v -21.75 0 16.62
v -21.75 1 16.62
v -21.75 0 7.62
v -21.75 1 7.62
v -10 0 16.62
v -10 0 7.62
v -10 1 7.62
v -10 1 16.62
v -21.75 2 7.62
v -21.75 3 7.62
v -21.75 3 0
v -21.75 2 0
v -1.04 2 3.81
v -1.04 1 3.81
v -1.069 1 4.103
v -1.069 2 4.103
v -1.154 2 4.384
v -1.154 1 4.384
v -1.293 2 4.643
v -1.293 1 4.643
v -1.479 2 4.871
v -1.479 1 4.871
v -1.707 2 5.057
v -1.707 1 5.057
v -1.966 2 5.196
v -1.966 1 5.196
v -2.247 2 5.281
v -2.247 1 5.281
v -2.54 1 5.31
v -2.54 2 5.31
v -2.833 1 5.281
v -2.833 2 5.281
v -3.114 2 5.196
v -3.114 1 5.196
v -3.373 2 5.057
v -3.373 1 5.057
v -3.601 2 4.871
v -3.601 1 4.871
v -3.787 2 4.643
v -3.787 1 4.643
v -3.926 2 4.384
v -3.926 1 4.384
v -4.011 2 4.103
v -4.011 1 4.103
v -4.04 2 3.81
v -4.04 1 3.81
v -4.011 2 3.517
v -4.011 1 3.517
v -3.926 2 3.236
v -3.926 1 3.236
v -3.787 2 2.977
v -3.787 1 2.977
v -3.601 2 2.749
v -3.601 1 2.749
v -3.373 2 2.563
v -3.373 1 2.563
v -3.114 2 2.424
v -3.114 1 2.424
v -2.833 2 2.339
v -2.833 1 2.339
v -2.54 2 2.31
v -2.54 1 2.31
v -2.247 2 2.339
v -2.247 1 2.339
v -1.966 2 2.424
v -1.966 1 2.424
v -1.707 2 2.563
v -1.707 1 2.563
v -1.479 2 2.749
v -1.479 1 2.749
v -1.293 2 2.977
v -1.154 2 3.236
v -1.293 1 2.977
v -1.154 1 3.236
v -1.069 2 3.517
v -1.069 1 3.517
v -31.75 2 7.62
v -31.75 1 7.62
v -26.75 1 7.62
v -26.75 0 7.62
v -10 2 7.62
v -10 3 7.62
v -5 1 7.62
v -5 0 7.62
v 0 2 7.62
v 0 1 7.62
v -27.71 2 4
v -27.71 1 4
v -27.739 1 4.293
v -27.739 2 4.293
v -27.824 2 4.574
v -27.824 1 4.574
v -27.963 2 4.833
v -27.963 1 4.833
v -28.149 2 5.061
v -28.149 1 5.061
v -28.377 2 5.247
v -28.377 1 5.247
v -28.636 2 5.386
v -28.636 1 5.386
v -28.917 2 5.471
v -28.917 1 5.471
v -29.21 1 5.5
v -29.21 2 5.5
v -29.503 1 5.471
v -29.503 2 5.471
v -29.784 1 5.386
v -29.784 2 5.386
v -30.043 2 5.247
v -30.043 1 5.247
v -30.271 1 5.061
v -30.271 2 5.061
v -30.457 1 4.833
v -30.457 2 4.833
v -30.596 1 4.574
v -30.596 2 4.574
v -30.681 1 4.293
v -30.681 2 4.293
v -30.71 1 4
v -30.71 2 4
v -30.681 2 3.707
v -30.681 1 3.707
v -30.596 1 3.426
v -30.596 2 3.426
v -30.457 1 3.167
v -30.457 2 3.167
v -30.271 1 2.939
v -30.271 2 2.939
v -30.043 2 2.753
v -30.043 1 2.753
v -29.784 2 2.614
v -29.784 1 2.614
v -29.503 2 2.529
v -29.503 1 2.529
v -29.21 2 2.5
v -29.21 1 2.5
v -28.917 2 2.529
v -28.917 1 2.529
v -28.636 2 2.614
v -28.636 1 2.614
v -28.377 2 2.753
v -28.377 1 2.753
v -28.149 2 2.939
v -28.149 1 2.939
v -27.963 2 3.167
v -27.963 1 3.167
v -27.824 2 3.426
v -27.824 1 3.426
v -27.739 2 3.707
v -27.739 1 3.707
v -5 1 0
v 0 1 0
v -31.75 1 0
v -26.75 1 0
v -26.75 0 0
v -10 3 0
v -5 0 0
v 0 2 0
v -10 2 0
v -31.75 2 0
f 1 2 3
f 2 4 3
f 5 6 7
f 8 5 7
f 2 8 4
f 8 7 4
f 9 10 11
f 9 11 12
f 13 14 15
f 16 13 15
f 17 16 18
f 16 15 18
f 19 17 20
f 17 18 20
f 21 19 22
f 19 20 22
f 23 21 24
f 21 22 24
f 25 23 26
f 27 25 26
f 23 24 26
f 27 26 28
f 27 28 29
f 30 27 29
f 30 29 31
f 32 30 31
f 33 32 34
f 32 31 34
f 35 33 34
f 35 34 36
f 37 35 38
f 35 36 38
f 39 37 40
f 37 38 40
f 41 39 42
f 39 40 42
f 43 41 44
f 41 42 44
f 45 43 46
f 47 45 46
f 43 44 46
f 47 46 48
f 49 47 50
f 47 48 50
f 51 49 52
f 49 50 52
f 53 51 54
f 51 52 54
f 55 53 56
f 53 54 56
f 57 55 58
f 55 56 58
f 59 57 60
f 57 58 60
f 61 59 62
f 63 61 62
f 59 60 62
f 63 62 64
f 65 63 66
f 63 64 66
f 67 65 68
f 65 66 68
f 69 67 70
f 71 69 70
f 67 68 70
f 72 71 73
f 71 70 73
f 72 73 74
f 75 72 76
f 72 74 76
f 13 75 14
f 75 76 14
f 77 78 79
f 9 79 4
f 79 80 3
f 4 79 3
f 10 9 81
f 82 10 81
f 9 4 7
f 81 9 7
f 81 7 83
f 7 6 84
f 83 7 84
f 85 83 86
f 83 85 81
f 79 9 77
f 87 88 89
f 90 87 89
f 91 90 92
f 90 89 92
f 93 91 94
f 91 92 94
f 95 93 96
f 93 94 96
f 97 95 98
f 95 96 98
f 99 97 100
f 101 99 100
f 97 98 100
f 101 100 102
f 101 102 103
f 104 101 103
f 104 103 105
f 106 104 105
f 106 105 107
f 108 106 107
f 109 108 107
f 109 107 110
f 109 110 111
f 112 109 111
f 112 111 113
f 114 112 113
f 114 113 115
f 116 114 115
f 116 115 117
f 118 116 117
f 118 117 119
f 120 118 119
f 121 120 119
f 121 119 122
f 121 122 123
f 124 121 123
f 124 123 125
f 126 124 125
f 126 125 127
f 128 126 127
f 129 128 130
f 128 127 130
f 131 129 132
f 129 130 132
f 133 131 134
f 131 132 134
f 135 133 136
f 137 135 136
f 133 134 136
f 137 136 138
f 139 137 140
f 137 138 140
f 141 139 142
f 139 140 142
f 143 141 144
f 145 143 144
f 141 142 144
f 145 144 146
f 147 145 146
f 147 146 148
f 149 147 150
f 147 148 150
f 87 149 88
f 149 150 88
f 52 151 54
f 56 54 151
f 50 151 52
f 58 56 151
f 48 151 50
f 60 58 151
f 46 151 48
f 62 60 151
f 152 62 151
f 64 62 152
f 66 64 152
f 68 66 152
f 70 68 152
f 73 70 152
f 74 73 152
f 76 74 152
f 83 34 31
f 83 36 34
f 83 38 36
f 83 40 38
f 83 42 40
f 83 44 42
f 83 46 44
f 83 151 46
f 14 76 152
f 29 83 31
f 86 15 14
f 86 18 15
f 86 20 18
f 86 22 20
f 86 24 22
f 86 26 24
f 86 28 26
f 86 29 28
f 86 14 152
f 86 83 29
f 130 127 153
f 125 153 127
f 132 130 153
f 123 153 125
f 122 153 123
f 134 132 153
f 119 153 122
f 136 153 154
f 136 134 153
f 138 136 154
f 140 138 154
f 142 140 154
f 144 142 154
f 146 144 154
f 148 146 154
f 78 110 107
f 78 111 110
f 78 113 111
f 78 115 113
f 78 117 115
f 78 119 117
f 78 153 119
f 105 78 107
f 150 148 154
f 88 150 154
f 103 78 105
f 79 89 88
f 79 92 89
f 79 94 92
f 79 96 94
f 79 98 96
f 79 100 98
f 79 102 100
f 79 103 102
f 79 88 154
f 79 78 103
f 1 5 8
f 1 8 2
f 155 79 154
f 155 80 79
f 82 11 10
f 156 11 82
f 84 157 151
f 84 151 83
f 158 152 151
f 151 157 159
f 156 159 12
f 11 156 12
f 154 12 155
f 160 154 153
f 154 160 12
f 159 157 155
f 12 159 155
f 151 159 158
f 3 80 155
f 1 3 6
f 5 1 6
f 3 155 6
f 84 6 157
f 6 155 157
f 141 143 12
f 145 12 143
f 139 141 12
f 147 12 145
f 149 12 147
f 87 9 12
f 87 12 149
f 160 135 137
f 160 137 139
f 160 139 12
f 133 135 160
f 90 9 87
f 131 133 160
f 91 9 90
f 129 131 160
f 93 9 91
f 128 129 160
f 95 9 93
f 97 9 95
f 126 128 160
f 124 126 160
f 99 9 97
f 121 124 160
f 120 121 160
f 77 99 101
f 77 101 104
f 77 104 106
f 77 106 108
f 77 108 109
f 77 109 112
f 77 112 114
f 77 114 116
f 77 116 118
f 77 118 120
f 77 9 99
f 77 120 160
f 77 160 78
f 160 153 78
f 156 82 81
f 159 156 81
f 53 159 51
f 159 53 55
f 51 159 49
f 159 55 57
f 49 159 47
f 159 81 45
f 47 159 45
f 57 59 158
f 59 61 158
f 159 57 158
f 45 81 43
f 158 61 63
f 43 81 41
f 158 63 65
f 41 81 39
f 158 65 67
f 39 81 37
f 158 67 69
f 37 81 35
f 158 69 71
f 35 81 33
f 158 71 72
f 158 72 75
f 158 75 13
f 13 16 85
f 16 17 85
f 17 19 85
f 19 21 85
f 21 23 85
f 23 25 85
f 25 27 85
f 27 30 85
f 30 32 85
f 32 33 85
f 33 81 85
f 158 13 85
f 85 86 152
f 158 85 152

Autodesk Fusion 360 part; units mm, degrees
sketch "Sketch6" plane through (0, 0, 0) normal (0, 1, 0) x (1, 0, 0)
  line L0 (0, 0) -> (-31.75, 0)
  line L1 (-31.75, 0) -> (-31.75, -7.62)
  line L2 (-31.75, -7.62) -> (0, -7.62)
  line L3 (0, -7.62) -> (0, 0)
  dimension "d16" = 7.62
  dimension "d17" = 31.75
extrude "Extrude5" add sketch "Sketch6" along normal blind 3
sketch "Sketch7" plane through (0, 0, 0) normal (0, -1, 0) x (1, 0, 0)
  line L0 (0, 0) -> (0, 7.62)
  line L1 (0, 7.62) -> (-31.75, 7.62)
  line L2 (-31.75, 7.62) -> (-31.75, 0)
  line L3 (-31.75, 0) -> (0, 0)
  circle A0 centre (-29.21, 4) radius 1.5
  circle A1 centre (-2.54, 3.81) radius 1.5
  line L4 (-31.75, 7.62) -> (-26.75, 7.62)
  line L5 (-26.75, 7.62) -> (-26.75, 0)
  line L6 (-26.75, 0) -> (-31.75, 0)
  line L7 (-31.75, 0) -> (-31.75, 7.62)
  line L8 (0, 0) -> (-5, 0)
  line L9 (-5, 0) -> (-5, 7.62)
  line L10 (-5, 7.62) -> (0, 7.62)
  line L11 (0, 7.62) -> (0, 0)
  line L12 (-31.75, 7.62) -> (-21.75, 7.62)
  line L13 (-21.75, 7.62) -> (-21.75, 0)
  line L14 (-21.75, 0) -> (-31.75, 0)
  line L15 (-31.75, 0) -> (-31.75, 7.62)
  line L16 (0, 0) -> (-10, 0)
  line L17 (-10, 0) -> (-10, 7.62)
  line L18 (-10, 7.62) -> (0, 7.62)
  line L19 (0, 7.62) -> (0, 0)
  dimension "d20" = 3
  dimension "d21" = 3
  dimension "d22" = 26.67
  dimension "d24" = 2.54
  dimension "d25" = 3.81
  dimension "d30" = 5
  dimension "d31" = 5
  dimension "d36" = 10
  dimension "d37" = 10
extrude "Extrude8" cut sketch "Sketch7" against normal blind 1 contours L1 L2 L3 L4 L5 L6 L7 L12 L14 L15
extrude "Extrude7" cut sketch "Sketch7" against normal blind 3 contours A1
extrude "Extrude6" cut sketch "Sketch7" against normal blind 3 contours A0
extrude "Extrude9" cut sketch "Sketch7" against normal blind 1 contours L0 L1 L3 L8 L9 L10 L11 L16 L18 L19
sketch "Sketch8" plane through (0, 3, 0) normal (0, 1, 0) x (-1, 0, 0)
  circle A0 centre (29.21, 4) radius 1.5
  circle A1 centre (2.54, 3.81) radius 1.5
  line L0 (0, 7.62) -> (0, 0)
  line L1 (0, 0) -> (31.75, 0)
  line L2 (31.75, 0) -> (31.75, 7.62)
  line L3 (31.75, 7.62) -> (0, 7.62)
sketch "Sketch9" plane through (0, 0, 7.62) normal (0, 0, 1) x (-1, 0, 0)
  line L0 (5, -1) -> (0, -1)
  line L1 (0, -1) -> (0, -3)
  line L2 (0, -3) -> (31.75, -3)
  line L3 (31.75, -3) -> (31.75, -1)
  line L4 (31.75, -1) -> (26.75, -1)
  line L5 (26.75, -1) -> (26.75, 0)
  line L6 (26.75, 0) -> (5, 0)
  line L7 (5, 0) -> (5, -1)
  line L8 (31.75, -3) -> (21.75, -3)
  line L9 (21.75, -3) -> (21.75, -2)
  line L10 (21.75, -2) -> (31.75, -2)
  line L11 (31.75, -2) -> (31.75, -3)
  line L12 (0, -3) -> (10, -3)
  line L13 (10, -3) -> (10, -2)
  line L14 (10, -2) -> (0, -2)
  line L15 (0, -2) -> (0, -3)
  line L16 (21.75, -3) -> (10, -3)
  line L17 (10, -3) -> (10, -2)
  line L18 (10, -2) -> (21.75, -2)
  line L19 (21.75, -2) -> (21.75, -3)
  line L20 (21.75, 0) -> (10, 0)
  line L21 (10, 0) -> (10, -1)
  line L22 (10, -1) -> (21.75, -1)
  line L23 (21.75, -1) -> (21.75, 0)
  dimension "d39" = 10
  dimension "d40" = 1
  dimension "d45" = 11.75
extrude "Extrude12" add sketch "Sketch9" along normal blind 9 contours L6 L20 L21 L22 L23
extrude "Extrude11" cut sketch "Sketch9" against normal blind 10 contours L1 L2 L12 L13 L14 L15 L17
extrude "Extrude10" cut sketch "Sketch9" against normal blind 10 contours L2 L3 L8 L9 L10 L11 L19
